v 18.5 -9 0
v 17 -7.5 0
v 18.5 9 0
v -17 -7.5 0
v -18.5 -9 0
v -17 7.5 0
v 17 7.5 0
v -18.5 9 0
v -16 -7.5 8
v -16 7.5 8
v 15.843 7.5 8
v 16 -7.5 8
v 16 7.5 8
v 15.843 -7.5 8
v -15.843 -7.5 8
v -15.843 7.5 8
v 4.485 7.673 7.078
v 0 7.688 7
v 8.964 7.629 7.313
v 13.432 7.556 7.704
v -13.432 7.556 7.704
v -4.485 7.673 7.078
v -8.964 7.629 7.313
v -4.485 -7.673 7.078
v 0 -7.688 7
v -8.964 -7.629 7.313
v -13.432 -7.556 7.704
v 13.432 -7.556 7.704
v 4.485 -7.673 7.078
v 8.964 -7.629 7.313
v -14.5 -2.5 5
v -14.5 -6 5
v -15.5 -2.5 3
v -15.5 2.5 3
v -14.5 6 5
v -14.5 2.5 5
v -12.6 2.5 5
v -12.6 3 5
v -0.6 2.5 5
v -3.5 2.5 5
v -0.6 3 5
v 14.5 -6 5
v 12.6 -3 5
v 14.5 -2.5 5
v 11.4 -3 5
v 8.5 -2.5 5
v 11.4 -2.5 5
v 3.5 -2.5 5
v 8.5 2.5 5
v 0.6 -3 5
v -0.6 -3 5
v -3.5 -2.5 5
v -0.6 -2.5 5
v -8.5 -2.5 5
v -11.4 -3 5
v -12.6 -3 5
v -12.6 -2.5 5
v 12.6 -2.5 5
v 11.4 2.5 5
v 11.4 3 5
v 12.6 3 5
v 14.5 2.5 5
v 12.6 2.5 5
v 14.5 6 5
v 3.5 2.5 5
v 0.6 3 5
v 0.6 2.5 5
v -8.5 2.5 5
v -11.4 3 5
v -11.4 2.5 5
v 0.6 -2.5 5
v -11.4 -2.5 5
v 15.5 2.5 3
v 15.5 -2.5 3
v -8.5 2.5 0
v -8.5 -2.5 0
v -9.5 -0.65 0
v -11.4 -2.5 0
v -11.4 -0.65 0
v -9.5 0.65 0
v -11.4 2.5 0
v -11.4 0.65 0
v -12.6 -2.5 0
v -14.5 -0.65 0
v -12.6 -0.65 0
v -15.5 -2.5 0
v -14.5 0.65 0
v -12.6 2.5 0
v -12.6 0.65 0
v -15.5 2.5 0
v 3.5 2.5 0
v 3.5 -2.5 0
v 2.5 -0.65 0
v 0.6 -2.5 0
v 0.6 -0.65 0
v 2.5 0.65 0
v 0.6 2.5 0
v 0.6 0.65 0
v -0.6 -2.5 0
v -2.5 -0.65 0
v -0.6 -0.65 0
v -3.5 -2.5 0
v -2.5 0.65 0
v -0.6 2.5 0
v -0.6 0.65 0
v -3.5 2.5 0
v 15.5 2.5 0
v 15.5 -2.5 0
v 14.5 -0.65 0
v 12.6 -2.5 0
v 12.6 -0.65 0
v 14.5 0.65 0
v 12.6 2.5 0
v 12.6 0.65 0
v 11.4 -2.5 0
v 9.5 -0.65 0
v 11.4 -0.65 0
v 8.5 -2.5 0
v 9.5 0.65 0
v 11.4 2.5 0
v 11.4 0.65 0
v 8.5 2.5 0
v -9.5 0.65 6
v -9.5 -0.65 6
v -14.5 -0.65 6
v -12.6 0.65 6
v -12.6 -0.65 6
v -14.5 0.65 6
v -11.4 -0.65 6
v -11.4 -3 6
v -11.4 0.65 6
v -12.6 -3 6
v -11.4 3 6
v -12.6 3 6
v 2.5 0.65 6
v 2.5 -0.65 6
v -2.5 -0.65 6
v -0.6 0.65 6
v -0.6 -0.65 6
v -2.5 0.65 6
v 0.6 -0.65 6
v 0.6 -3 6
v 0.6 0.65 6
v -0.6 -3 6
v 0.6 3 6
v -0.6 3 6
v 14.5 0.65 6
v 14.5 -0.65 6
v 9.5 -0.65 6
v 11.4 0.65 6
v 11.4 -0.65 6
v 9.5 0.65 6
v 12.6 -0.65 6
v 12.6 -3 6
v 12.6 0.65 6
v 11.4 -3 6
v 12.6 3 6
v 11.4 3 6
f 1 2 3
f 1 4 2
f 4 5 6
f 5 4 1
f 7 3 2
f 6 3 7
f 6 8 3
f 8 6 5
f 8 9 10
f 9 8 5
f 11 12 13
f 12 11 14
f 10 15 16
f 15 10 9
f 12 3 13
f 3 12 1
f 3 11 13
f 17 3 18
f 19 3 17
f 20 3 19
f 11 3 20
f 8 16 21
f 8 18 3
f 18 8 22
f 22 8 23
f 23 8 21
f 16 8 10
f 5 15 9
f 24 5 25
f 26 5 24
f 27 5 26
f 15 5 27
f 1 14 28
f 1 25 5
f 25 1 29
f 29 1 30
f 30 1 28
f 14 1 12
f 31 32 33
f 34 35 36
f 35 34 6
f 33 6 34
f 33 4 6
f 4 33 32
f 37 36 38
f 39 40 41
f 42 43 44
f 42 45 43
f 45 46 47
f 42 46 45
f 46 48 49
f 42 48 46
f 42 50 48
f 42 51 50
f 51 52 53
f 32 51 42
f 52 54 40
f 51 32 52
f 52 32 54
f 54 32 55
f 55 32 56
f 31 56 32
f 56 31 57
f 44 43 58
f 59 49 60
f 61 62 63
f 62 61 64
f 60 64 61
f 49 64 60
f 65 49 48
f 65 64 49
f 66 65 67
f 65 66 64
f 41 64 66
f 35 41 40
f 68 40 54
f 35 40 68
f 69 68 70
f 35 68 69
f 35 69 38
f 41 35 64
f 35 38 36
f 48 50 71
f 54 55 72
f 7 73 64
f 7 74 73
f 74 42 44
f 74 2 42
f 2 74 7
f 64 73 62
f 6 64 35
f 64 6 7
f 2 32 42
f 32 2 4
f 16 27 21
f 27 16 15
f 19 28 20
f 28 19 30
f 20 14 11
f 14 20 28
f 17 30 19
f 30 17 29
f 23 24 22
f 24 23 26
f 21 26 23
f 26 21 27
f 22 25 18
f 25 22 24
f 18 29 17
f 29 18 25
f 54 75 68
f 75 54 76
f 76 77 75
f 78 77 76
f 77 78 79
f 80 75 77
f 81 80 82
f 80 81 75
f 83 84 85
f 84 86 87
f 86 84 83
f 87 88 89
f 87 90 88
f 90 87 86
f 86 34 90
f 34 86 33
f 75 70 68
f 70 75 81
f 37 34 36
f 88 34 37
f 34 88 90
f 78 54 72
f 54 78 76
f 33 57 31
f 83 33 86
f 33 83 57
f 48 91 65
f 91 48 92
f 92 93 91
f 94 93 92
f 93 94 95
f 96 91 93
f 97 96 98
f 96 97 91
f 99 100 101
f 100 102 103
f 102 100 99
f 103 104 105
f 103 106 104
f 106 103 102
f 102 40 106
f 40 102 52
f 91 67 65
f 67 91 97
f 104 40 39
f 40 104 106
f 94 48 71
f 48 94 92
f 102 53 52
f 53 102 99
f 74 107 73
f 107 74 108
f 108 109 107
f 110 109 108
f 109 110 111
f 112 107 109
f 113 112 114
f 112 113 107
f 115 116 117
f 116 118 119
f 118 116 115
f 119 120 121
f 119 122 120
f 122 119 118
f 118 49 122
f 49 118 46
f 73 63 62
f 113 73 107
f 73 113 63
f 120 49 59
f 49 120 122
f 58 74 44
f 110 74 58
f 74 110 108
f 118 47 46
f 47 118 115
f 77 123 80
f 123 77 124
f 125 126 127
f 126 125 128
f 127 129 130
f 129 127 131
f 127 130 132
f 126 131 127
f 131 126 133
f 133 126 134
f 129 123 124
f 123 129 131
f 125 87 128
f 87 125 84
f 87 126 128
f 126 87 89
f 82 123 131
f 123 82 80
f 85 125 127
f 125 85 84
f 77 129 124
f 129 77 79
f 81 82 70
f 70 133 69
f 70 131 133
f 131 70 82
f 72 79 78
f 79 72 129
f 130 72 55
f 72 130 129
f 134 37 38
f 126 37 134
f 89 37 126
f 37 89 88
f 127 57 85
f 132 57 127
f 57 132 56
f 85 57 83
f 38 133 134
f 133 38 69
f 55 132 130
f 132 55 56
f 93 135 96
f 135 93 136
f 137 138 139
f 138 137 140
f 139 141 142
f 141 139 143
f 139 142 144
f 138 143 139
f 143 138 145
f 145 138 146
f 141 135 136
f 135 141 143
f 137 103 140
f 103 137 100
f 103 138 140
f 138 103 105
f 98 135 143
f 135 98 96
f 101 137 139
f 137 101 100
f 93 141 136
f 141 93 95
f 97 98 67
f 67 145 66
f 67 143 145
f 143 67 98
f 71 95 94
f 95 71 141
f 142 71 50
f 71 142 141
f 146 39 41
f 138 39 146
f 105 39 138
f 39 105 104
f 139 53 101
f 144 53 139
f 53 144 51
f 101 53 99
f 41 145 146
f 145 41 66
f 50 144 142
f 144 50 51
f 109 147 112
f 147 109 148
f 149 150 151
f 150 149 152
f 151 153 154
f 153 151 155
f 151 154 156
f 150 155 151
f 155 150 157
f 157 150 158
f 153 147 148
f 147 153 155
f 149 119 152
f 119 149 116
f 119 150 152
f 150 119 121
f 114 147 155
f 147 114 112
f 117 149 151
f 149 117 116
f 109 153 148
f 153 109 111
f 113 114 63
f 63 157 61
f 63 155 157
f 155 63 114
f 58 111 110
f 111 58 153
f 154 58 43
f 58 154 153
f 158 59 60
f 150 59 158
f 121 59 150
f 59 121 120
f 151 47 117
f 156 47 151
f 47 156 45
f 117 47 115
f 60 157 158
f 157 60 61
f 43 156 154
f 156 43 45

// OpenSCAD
key_height = 8;

bottom_x_size = 37;
bottom_y_size = 18;

top_x_size = 32;
top_y_size = 15;

difference() {
  union() {
    difference() {
      linear_extrude(height = key_height, scale = [top_x_size / bottom_x_size, top_y_size / bottom_y_size]) {
        square(size=[bottom_x_size, bottom_y_size], center=true);
      }
      linear_extrude(height = 5, scale = [(top_x_size-3)/(bottom_x_size-3), (top_y_size-3)/(bottom_y_size-3)]) {
        square(size=[bottom_x_size-3, bottom_y_size-3], center=true);
      }
      rotate([90, 0, 0]) {
        translate([0, 127.5 + key_height, 0]) {
          cylinder(r=128.5, h = top_y_size + 2, center = true, $fn=180);
        }
      }
    }
    for (offset=[-12, 0, 12]) {
      translate([offset, 0, 3]) cube([7, 5, 6], center=true);
    }
  }
  for (offset=[-12, 0, 12]) {
    translate([offset, 0, 3]) {
      cube([5, 1.3, 6], center=true);
      cube([1.2, 6, 6], center=true);
    }
  }
}
